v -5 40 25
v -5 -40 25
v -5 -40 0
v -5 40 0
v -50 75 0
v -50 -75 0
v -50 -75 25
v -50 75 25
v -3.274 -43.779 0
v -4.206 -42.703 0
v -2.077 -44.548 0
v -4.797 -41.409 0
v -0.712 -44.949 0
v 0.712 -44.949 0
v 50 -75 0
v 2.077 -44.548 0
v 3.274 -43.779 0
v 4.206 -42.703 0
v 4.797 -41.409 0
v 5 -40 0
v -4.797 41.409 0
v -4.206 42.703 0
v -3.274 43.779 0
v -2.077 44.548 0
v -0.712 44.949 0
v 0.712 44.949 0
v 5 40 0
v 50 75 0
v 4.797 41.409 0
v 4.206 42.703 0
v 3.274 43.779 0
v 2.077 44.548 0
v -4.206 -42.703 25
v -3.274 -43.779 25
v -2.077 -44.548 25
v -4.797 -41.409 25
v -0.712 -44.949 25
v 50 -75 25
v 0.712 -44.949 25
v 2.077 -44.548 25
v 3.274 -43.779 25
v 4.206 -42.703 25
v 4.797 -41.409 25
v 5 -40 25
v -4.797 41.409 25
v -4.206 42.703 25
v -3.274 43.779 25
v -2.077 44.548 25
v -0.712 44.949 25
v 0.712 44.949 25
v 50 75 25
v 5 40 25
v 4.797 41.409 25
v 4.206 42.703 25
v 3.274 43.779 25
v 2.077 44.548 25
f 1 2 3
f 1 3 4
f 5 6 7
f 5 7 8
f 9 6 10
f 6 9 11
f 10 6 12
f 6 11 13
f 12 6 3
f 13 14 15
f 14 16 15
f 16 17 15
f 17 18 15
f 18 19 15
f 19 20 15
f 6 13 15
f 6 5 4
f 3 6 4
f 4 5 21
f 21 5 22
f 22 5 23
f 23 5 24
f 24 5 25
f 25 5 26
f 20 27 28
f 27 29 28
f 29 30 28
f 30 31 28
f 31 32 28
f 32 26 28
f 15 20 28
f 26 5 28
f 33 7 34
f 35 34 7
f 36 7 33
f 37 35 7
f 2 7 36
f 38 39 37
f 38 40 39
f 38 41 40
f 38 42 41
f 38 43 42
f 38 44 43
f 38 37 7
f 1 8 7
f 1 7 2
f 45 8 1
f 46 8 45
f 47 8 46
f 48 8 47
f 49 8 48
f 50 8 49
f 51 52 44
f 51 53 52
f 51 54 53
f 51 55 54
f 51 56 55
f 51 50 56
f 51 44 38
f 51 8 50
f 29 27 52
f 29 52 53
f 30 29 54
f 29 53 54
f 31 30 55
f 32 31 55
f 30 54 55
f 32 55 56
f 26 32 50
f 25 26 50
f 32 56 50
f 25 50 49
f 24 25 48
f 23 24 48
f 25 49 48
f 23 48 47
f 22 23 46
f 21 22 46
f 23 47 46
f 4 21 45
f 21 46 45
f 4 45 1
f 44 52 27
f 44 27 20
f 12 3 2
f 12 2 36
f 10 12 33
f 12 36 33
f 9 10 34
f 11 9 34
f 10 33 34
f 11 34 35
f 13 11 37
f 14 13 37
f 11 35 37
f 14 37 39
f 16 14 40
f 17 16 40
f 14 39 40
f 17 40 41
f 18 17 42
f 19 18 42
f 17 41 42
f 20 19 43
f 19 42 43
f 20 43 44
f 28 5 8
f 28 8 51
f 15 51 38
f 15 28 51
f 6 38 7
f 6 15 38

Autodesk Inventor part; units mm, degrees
ref_plane "YZ Plane" through (0, 0, 0) normal (1, 0, 0) x (0, 1, 0)
ref_plane "XZ Plane" through (0, 0, 0) normal (0, 1, 0) x (-1, 0, 0)
ref_plane "XY Plane" through (0, 0, 0) normal (0, 0, 1) x (1, 0, 0)
sketch "Sketch1" plane through (0, 0, 0) normal (0, 0, 1) x (1, 0, 0)
  line L0 (-50, 75) -> (50, 75)
  line L1 (50, 75) -> (50, -75)
  line L2 (50, -75) -> (-50, -75)
  line L3 (-50, -75) -> (-50, 75)
  point P0 (0, 0)
  point P1 (0, 75)
  point P2 (-50, 0)
  dimension "d0" = 100
  dimension "d1" = 150
extrude "Extrusion1" add sketch "Sketch1" along normal blind 25
sketch "Sketch2" plane through (0, 0, 25) normal (0, 0, 1) x (1, 0, 0)
  line L0 (-50, -75) -> (50, -75) projected
  line L1 (0, -75) -> (0, -50) construction
  line L2 (0, -50) -> (0, -40) construction
  line L3 (-5, 40) -> (5, 40) construction
  line L4 (5, 40) -> (5, -40)
  line L5 (5, -40) -> (-5, -40) construction
  line L6 (-5, -40) -> (-5, 40)
  arc A0 (-5, -40) -> (5, -40) centre (0, -40) ccw
  arc A1 (5, 40) -> (-5, 40) centre (0, 40) ccw
  line L7 (50, 75) -> (-50, 75) projected
  line L8 (0, 75) -> (0, 50) construction
  line L9 (0, 50) -> (0, 40) construction
  point P0 (0, 0)
  dimension "d4" = 25
  dimension "d5" = 10
  dimension "d6" = 10
  dimension "d8" = 25
  dimension "d11" = 10
extrude "Extrusion2" cut sketch "Sketch2" against normal through all
properties part number "Foam_Hammer_Side" material "Polystyrene, Expanded"
